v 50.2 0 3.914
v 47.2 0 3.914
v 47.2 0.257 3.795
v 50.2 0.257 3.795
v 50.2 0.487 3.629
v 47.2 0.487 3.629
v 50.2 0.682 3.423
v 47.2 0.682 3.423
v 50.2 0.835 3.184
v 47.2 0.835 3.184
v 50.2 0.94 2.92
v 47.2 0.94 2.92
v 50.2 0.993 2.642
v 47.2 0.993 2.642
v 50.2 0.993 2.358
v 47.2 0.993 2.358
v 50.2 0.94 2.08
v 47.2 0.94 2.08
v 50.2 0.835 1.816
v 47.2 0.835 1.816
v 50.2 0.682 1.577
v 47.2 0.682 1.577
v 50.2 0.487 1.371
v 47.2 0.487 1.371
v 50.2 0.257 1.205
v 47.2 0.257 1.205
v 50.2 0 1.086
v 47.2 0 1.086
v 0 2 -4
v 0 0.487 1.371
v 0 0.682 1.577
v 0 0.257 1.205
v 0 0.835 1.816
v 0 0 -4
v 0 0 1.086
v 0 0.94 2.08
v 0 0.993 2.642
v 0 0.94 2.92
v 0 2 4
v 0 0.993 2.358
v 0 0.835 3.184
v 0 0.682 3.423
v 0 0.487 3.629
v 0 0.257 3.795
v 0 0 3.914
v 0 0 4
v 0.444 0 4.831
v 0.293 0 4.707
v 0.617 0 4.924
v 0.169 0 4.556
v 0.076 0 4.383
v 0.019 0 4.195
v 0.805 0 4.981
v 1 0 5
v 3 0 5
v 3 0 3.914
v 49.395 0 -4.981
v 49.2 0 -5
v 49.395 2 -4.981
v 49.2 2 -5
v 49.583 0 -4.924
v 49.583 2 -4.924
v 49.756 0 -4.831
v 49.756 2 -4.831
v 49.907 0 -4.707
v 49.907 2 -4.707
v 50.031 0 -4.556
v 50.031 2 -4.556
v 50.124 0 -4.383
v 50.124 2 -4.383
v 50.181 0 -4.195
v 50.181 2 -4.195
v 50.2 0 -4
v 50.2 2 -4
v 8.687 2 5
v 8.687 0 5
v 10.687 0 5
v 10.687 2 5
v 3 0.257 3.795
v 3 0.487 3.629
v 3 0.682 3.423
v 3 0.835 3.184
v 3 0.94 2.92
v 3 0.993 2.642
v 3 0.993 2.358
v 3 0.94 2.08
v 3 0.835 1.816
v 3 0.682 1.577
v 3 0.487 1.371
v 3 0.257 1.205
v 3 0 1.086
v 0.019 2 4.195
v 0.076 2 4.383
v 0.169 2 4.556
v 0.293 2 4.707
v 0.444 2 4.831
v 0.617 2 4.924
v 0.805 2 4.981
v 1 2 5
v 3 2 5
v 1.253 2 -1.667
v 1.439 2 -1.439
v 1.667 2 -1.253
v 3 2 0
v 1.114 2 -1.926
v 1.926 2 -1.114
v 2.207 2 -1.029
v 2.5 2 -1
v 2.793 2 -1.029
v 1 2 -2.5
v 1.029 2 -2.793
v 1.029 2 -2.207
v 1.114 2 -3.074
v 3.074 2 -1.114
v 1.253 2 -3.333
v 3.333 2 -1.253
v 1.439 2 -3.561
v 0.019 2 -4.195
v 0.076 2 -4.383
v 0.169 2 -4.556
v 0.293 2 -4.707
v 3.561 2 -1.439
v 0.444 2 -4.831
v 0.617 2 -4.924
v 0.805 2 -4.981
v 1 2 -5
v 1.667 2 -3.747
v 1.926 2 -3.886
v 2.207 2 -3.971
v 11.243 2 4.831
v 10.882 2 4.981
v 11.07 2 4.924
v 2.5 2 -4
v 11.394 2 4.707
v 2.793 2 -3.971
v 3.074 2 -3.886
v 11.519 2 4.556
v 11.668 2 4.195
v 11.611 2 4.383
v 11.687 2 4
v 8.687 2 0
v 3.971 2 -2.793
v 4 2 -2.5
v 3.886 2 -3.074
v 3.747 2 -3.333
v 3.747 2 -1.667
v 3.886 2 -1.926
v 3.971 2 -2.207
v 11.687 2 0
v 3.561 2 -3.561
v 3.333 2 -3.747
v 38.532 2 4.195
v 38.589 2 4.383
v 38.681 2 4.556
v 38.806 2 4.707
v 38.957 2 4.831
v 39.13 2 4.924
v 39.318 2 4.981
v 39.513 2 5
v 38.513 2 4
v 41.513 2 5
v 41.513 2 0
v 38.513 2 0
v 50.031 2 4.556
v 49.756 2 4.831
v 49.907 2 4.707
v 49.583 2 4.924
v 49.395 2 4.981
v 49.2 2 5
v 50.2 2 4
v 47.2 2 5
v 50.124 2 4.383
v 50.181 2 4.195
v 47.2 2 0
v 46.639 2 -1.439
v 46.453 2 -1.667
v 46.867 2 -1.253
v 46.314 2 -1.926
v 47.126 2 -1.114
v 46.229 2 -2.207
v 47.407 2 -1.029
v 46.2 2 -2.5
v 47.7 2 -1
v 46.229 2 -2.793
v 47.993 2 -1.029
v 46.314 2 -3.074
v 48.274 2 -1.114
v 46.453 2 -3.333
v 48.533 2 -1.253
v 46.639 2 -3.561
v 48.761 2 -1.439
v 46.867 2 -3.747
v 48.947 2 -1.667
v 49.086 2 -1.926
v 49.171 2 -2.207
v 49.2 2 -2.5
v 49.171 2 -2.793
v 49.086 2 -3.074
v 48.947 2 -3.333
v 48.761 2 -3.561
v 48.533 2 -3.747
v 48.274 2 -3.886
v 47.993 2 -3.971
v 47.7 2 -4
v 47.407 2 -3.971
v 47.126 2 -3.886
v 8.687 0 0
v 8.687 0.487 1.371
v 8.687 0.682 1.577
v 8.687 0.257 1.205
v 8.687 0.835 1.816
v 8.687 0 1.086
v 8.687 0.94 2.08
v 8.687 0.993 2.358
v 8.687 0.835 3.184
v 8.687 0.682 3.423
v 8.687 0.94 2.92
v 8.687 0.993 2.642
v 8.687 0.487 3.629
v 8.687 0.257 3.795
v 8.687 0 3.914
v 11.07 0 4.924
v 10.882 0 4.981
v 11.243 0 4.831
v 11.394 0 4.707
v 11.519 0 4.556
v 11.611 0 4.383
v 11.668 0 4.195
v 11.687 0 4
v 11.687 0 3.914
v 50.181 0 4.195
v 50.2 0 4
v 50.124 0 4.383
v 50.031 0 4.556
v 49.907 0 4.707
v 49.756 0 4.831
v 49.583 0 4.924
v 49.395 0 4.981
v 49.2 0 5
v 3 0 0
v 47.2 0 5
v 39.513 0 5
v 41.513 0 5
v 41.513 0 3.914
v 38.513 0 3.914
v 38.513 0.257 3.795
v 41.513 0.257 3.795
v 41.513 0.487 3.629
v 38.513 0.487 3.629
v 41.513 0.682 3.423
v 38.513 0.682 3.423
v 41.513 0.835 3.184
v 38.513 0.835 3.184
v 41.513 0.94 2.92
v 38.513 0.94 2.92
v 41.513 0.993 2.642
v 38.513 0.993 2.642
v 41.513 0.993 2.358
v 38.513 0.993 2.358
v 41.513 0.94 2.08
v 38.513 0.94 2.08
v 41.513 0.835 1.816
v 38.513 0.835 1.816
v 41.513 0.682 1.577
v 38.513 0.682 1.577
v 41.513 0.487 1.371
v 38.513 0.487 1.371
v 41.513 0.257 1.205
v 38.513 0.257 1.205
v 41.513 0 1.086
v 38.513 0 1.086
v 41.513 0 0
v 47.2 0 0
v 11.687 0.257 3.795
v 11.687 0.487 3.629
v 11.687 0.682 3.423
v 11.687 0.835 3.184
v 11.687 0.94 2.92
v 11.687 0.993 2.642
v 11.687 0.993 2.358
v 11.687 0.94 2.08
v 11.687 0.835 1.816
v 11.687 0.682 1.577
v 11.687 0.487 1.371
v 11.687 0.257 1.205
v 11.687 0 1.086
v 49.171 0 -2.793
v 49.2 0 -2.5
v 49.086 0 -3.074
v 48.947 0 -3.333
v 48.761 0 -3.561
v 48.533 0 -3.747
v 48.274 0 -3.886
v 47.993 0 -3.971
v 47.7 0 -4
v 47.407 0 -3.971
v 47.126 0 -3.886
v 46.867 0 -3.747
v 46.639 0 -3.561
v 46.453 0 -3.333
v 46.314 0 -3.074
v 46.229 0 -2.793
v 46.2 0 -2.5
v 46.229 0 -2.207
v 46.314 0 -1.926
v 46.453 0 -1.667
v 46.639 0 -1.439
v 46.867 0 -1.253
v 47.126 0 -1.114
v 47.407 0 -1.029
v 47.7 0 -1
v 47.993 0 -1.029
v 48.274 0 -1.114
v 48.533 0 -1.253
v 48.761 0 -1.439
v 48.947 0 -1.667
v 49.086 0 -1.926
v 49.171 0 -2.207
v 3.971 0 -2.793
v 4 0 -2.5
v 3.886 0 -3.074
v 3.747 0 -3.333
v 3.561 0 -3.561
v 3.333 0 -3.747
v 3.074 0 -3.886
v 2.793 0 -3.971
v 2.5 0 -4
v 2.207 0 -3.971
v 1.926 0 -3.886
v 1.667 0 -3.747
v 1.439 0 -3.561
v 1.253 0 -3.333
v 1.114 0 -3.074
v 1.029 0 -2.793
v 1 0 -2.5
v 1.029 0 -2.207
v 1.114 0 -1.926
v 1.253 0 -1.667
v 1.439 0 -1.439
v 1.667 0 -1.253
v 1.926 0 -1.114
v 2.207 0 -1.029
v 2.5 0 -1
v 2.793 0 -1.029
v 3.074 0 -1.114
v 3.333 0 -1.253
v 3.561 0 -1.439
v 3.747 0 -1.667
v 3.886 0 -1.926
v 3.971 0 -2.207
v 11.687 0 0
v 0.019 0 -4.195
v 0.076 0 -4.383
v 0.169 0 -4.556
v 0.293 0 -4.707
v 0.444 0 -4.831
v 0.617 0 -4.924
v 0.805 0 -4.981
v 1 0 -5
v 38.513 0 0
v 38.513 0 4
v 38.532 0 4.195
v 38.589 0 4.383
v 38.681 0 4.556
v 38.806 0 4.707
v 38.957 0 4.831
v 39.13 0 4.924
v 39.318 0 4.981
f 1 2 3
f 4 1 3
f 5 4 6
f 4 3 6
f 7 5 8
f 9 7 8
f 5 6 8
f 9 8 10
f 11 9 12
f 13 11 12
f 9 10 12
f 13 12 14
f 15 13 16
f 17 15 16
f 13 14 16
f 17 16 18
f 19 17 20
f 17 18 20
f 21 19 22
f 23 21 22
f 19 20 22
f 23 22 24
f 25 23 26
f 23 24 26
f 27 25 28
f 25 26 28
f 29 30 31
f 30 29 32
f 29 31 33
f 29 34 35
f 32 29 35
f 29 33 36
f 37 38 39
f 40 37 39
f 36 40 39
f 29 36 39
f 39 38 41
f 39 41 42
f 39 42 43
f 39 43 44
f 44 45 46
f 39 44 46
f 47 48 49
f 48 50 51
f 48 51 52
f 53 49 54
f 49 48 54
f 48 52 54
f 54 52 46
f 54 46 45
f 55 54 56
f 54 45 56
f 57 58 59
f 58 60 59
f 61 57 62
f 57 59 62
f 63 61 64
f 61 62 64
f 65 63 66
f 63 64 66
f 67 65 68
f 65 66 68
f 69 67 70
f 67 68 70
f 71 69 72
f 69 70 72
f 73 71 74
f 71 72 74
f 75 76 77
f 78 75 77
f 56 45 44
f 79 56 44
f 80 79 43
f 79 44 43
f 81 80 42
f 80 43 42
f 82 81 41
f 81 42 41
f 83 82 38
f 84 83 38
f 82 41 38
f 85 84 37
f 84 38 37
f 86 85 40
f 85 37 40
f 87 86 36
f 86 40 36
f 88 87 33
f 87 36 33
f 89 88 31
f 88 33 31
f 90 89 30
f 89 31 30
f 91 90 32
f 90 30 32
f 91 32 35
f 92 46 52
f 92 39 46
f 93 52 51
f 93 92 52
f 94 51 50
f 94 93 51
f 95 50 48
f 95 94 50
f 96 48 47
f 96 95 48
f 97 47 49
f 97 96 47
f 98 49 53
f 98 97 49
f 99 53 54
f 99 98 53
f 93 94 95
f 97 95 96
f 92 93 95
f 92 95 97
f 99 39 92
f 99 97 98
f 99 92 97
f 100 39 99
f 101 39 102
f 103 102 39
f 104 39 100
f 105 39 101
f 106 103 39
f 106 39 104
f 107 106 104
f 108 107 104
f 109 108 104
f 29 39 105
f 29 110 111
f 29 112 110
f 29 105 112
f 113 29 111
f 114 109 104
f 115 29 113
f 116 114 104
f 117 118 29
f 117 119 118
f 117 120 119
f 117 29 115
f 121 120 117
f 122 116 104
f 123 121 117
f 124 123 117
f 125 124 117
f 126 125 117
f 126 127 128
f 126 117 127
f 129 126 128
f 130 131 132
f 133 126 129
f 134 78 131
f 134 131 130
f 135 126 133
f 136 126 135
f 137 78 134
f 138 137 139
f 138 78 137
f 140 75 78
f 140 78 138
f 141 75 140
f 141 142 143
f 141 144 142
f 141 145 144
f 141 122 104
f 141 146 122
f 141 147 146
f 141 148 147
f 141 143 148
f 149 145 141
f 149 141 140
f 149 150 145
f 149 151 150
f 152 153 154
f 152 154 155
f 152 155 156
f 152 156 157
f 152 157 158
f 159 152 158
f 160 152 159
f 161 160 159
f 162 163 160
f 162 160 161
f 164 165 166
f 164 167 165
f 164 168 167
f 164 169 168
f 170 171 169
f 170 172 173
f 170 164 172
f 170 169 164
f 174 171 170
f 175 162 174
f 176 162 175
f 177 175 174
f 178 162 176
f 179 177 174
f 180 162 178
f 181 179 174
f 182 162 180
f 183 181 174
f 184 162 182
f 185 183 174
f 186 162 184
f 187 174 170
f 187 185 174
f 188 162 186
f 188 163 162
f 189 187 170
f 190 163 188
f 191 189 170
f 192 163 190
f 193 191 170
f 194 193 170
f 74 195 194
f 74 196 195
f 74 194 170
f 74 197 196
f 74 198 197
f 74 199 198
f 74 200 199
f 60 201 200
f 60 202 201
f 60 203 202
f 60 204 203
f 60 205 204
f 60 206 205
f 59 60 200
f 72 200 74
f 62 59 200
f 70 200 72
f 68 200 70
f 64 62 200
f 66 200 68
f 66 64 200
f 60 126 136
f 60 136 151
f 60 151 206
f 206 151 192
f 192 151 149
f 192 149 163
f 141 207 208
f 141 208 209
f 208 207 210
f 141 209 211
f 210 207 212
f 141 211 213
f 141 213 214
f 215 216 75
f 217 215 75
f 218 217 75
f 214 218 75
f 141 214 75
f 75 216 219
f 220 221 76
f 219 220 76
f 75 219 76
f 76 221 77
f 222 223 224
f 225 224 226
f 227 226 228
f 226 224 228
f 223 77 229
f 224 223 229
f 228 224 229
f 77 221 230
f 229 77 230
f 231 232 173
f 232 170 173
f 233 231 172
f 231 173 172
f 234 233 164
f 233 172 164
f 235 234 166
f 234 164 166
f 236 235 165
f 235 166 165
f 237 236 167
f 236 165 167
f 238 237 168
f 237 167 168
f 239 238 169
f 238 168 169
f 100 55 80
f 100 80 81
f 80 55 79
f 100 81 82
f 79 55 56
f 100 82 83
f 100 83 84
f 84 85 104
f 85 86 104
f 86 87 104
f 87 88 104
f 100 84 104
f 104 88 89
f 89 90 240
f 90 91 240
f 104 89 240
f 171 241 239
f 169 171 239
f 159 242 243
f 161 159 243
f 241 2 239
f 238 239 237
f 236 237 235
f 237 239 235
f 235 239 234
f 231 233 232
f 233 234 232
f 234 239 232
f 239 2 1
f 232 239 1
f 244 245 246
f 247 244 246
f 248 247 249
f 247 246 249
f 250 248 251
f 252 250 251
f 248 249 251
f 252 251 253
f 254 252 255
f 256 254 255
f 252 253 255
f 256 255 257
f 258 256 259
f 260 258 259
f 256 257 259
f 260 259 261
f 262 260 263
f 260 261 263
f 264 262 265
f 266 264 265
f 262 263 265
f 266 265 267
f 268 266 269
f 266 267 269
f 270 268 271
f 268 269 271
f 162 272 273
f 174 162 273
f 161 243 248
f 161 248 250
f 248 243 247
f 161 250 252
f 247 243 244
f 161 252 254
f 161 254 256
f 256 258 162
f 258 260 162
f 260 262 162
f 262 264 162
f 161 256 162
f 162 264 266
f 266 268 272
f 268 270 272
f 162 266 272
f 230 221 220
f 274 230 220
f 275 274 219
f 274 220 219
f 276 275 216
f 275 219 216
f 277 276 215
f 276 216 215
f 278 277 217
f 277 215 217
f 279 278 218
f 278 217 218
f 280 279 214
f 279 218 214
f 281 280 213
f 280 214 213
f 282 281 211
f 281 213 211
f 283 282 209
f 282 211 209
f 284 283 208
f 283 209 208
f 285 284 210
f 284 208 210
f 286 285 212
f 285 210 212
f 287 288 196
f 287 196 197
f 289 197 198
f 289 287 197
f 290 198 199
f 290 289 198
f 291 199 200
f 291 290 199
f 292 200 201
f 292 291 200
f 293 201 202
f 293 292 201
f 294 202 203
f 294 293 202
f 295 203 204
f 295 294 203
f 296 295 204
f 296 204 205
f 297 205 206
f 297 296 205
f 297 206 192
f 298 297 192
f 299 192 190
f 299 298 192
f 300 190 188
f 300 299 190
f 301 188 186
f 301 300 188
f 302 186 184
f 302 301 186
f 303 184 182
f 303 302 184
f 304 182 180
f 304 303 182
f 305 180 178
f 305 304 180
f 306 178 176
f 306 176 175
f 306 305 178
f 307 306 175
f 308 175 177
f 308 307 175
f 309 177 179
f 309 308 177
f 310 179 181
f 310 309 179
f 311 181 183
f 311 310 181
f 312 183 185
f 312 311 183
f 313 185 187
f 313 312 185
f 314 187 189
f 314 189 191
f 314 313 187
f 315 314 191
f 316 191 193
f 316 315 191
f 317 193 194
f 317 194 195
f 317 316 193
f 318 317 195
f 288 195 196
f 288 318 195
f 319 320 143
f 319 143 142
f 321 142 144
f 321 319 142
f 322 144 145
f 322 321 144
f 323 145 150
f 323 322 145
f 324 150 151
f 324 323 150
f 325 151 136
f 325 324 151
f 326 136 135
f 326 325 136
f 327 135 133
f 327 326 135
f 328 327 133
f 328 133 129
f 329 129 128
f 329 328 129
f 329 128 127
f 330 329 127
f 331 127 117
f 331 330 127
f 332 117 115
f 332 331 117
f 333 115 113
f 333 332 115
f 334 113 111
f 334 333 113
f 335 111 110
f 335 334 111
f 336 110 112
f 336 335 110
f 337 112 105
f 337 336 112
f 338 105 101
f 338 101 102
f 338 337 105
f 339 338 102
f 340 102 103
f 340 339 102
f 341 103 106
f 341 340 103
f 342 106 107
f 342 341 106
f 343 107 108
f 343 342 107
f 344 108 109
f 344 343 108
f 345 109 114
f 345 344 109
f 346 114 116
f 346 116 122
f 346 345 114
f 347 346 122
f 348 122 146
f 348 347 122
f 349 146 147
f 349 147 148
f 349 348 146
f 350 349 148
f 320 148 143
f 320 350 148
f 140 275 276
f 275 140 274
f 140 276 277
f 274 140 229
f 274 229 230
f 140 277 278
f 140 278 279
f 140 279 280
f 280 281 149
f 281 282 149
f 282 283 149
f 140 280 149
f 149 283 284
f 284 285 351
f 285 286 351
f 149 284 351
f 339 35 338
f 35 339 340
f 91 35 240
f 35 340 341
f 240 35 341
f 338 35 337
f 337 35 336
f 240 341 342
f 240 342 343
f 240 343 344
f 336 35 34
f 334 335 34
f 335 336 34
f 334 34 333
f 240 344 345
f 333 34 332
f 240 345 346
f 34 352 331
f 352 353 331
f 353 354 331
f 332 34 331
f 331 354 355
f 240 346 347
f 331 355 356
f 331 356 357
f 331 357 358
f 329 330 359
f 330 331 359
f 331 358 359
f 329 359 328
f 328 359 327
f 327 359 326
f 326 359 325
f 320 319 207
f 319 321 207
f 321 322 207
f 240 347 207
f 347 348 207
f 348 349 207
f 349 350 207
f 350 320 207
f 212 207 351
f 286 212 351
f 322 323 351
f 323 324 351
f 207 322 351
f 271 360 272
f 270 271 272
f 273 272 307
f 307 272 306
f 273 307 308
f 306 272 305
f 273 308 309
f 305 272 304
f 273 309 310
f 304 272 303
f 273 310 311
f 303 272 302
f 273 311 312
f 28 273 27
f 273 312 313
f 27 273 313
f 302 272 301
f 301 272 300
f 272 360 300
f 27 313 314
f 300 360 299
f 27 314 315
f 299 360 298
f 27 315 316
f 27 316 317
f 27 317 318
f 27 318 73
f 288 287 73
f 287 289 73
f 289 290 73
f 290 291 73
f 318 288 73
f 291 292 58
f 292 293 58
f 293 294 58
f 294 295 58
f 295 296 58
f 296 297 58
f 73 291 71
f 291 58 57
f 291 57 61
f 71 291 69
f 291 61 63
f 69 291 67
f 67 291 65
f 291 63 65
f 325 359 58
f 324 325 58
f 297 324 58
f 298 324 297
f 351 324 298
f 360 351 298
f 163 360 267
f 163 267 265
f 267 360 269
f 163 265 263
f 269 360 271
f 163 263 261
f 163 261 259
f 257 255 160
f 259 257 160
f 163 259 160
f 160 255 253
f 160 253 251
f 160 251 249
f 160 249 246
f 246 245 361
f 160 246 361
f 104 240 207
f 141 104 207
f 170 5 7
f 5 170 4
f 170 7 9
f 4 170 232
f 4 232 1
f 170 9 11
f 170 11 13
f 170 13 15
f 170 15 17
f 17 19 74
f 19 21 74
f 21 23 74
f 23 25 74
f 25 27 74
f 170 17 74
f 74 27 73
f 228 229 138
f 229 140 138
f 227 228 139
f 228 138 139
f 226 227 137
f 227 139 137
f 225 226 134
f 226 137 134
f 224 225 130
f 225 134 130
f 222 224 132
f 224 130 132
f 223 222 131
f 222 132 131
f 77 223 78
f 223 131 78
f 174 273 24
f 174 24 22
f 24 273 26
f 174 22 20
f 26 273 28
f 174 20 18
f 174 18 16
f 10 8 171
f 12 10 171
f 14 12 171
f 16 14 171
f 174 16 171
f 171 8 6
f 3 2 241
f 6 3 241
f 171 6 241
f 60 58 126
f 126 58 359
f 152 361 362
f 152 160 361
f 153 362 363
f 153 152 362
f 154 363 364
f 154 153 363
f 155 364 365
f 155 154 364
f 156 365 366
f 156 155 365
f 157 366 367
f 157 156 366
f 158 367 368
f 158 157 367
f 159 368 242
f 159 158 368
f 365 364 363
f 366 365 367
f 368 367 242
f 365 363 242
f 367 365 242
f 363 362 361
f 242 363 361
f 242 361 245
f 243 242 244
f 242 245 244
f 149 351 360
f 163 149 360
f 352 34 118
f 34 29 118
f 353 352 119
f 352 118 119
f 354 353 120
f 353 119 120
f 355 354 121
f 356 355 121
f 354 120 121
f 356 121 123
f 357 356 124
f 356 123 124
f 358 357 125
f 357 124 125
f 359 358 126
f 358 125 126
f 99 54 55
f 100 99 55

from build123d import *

# Parameters (mm, degrees)
SKETCH1_R           = 1.5
BOSS_EXTRUDE1_DEPTH = 2
SKETCH2_R           = 1.5
CUT_EXTRUDE1_DEPTH  = 55
FILLET1_R           = 1


with BuildPart() as part:
    # Sketch1 → Boss-Extrude1 (new body)
    with BuildSketch(Plane(origin=(0, 0, 0), x_dir=(1, 0, 0), z_dir=(0, 1, 0))):
        Polygon((0, 5), (0, -5), (3, -5), (3, 0), (8.68728571, 0), (8.68728571, -5), (11.68728571, -5), (11.68728571, 0), (38.51271429, 0), (38.51271429, -5), (41.51271429, -5), (41.51271429, 0), (47.2, 0), (47.2, -5), (50.2, -5), (50.2, 5), align=None)
        with Locations((2.5, 2.5)):
            Circle(SKETCH1_R, mode=Mode.SUBTRACT)
        with Locations((47.7, 2.5)):
            Circle(SKETCH1_R, mode=Mode.SUBTRACT)
    extrude(amount=BOSS_EXTRUDE1_DEPTH)

    # Sketch2 → Cut-Extrude1 (cut)
    with BuildSketch(Plane.ZY):
        with Locations((2.5, -0.5)):
            Circle(SKETCH2_R)
    extrude(amount=-CUT_EXTRUDE1_DEPTH, mode=Mode.SUBTRACT)

    # Fillet1
    fillet1_edges = [part.edges().sort_by_distance(p)[0] for p in [
        (50.2, 1, -5),
        (50.2, 1, 5),
        (38.51271429, 1, 5),
        (11.68728571, 1, 5),
        (0, 1, 5),
        (0, 1, -5),
    ]]
    fillet(fillet1_edges, radius=FILLET1_R)


solid = part.part
